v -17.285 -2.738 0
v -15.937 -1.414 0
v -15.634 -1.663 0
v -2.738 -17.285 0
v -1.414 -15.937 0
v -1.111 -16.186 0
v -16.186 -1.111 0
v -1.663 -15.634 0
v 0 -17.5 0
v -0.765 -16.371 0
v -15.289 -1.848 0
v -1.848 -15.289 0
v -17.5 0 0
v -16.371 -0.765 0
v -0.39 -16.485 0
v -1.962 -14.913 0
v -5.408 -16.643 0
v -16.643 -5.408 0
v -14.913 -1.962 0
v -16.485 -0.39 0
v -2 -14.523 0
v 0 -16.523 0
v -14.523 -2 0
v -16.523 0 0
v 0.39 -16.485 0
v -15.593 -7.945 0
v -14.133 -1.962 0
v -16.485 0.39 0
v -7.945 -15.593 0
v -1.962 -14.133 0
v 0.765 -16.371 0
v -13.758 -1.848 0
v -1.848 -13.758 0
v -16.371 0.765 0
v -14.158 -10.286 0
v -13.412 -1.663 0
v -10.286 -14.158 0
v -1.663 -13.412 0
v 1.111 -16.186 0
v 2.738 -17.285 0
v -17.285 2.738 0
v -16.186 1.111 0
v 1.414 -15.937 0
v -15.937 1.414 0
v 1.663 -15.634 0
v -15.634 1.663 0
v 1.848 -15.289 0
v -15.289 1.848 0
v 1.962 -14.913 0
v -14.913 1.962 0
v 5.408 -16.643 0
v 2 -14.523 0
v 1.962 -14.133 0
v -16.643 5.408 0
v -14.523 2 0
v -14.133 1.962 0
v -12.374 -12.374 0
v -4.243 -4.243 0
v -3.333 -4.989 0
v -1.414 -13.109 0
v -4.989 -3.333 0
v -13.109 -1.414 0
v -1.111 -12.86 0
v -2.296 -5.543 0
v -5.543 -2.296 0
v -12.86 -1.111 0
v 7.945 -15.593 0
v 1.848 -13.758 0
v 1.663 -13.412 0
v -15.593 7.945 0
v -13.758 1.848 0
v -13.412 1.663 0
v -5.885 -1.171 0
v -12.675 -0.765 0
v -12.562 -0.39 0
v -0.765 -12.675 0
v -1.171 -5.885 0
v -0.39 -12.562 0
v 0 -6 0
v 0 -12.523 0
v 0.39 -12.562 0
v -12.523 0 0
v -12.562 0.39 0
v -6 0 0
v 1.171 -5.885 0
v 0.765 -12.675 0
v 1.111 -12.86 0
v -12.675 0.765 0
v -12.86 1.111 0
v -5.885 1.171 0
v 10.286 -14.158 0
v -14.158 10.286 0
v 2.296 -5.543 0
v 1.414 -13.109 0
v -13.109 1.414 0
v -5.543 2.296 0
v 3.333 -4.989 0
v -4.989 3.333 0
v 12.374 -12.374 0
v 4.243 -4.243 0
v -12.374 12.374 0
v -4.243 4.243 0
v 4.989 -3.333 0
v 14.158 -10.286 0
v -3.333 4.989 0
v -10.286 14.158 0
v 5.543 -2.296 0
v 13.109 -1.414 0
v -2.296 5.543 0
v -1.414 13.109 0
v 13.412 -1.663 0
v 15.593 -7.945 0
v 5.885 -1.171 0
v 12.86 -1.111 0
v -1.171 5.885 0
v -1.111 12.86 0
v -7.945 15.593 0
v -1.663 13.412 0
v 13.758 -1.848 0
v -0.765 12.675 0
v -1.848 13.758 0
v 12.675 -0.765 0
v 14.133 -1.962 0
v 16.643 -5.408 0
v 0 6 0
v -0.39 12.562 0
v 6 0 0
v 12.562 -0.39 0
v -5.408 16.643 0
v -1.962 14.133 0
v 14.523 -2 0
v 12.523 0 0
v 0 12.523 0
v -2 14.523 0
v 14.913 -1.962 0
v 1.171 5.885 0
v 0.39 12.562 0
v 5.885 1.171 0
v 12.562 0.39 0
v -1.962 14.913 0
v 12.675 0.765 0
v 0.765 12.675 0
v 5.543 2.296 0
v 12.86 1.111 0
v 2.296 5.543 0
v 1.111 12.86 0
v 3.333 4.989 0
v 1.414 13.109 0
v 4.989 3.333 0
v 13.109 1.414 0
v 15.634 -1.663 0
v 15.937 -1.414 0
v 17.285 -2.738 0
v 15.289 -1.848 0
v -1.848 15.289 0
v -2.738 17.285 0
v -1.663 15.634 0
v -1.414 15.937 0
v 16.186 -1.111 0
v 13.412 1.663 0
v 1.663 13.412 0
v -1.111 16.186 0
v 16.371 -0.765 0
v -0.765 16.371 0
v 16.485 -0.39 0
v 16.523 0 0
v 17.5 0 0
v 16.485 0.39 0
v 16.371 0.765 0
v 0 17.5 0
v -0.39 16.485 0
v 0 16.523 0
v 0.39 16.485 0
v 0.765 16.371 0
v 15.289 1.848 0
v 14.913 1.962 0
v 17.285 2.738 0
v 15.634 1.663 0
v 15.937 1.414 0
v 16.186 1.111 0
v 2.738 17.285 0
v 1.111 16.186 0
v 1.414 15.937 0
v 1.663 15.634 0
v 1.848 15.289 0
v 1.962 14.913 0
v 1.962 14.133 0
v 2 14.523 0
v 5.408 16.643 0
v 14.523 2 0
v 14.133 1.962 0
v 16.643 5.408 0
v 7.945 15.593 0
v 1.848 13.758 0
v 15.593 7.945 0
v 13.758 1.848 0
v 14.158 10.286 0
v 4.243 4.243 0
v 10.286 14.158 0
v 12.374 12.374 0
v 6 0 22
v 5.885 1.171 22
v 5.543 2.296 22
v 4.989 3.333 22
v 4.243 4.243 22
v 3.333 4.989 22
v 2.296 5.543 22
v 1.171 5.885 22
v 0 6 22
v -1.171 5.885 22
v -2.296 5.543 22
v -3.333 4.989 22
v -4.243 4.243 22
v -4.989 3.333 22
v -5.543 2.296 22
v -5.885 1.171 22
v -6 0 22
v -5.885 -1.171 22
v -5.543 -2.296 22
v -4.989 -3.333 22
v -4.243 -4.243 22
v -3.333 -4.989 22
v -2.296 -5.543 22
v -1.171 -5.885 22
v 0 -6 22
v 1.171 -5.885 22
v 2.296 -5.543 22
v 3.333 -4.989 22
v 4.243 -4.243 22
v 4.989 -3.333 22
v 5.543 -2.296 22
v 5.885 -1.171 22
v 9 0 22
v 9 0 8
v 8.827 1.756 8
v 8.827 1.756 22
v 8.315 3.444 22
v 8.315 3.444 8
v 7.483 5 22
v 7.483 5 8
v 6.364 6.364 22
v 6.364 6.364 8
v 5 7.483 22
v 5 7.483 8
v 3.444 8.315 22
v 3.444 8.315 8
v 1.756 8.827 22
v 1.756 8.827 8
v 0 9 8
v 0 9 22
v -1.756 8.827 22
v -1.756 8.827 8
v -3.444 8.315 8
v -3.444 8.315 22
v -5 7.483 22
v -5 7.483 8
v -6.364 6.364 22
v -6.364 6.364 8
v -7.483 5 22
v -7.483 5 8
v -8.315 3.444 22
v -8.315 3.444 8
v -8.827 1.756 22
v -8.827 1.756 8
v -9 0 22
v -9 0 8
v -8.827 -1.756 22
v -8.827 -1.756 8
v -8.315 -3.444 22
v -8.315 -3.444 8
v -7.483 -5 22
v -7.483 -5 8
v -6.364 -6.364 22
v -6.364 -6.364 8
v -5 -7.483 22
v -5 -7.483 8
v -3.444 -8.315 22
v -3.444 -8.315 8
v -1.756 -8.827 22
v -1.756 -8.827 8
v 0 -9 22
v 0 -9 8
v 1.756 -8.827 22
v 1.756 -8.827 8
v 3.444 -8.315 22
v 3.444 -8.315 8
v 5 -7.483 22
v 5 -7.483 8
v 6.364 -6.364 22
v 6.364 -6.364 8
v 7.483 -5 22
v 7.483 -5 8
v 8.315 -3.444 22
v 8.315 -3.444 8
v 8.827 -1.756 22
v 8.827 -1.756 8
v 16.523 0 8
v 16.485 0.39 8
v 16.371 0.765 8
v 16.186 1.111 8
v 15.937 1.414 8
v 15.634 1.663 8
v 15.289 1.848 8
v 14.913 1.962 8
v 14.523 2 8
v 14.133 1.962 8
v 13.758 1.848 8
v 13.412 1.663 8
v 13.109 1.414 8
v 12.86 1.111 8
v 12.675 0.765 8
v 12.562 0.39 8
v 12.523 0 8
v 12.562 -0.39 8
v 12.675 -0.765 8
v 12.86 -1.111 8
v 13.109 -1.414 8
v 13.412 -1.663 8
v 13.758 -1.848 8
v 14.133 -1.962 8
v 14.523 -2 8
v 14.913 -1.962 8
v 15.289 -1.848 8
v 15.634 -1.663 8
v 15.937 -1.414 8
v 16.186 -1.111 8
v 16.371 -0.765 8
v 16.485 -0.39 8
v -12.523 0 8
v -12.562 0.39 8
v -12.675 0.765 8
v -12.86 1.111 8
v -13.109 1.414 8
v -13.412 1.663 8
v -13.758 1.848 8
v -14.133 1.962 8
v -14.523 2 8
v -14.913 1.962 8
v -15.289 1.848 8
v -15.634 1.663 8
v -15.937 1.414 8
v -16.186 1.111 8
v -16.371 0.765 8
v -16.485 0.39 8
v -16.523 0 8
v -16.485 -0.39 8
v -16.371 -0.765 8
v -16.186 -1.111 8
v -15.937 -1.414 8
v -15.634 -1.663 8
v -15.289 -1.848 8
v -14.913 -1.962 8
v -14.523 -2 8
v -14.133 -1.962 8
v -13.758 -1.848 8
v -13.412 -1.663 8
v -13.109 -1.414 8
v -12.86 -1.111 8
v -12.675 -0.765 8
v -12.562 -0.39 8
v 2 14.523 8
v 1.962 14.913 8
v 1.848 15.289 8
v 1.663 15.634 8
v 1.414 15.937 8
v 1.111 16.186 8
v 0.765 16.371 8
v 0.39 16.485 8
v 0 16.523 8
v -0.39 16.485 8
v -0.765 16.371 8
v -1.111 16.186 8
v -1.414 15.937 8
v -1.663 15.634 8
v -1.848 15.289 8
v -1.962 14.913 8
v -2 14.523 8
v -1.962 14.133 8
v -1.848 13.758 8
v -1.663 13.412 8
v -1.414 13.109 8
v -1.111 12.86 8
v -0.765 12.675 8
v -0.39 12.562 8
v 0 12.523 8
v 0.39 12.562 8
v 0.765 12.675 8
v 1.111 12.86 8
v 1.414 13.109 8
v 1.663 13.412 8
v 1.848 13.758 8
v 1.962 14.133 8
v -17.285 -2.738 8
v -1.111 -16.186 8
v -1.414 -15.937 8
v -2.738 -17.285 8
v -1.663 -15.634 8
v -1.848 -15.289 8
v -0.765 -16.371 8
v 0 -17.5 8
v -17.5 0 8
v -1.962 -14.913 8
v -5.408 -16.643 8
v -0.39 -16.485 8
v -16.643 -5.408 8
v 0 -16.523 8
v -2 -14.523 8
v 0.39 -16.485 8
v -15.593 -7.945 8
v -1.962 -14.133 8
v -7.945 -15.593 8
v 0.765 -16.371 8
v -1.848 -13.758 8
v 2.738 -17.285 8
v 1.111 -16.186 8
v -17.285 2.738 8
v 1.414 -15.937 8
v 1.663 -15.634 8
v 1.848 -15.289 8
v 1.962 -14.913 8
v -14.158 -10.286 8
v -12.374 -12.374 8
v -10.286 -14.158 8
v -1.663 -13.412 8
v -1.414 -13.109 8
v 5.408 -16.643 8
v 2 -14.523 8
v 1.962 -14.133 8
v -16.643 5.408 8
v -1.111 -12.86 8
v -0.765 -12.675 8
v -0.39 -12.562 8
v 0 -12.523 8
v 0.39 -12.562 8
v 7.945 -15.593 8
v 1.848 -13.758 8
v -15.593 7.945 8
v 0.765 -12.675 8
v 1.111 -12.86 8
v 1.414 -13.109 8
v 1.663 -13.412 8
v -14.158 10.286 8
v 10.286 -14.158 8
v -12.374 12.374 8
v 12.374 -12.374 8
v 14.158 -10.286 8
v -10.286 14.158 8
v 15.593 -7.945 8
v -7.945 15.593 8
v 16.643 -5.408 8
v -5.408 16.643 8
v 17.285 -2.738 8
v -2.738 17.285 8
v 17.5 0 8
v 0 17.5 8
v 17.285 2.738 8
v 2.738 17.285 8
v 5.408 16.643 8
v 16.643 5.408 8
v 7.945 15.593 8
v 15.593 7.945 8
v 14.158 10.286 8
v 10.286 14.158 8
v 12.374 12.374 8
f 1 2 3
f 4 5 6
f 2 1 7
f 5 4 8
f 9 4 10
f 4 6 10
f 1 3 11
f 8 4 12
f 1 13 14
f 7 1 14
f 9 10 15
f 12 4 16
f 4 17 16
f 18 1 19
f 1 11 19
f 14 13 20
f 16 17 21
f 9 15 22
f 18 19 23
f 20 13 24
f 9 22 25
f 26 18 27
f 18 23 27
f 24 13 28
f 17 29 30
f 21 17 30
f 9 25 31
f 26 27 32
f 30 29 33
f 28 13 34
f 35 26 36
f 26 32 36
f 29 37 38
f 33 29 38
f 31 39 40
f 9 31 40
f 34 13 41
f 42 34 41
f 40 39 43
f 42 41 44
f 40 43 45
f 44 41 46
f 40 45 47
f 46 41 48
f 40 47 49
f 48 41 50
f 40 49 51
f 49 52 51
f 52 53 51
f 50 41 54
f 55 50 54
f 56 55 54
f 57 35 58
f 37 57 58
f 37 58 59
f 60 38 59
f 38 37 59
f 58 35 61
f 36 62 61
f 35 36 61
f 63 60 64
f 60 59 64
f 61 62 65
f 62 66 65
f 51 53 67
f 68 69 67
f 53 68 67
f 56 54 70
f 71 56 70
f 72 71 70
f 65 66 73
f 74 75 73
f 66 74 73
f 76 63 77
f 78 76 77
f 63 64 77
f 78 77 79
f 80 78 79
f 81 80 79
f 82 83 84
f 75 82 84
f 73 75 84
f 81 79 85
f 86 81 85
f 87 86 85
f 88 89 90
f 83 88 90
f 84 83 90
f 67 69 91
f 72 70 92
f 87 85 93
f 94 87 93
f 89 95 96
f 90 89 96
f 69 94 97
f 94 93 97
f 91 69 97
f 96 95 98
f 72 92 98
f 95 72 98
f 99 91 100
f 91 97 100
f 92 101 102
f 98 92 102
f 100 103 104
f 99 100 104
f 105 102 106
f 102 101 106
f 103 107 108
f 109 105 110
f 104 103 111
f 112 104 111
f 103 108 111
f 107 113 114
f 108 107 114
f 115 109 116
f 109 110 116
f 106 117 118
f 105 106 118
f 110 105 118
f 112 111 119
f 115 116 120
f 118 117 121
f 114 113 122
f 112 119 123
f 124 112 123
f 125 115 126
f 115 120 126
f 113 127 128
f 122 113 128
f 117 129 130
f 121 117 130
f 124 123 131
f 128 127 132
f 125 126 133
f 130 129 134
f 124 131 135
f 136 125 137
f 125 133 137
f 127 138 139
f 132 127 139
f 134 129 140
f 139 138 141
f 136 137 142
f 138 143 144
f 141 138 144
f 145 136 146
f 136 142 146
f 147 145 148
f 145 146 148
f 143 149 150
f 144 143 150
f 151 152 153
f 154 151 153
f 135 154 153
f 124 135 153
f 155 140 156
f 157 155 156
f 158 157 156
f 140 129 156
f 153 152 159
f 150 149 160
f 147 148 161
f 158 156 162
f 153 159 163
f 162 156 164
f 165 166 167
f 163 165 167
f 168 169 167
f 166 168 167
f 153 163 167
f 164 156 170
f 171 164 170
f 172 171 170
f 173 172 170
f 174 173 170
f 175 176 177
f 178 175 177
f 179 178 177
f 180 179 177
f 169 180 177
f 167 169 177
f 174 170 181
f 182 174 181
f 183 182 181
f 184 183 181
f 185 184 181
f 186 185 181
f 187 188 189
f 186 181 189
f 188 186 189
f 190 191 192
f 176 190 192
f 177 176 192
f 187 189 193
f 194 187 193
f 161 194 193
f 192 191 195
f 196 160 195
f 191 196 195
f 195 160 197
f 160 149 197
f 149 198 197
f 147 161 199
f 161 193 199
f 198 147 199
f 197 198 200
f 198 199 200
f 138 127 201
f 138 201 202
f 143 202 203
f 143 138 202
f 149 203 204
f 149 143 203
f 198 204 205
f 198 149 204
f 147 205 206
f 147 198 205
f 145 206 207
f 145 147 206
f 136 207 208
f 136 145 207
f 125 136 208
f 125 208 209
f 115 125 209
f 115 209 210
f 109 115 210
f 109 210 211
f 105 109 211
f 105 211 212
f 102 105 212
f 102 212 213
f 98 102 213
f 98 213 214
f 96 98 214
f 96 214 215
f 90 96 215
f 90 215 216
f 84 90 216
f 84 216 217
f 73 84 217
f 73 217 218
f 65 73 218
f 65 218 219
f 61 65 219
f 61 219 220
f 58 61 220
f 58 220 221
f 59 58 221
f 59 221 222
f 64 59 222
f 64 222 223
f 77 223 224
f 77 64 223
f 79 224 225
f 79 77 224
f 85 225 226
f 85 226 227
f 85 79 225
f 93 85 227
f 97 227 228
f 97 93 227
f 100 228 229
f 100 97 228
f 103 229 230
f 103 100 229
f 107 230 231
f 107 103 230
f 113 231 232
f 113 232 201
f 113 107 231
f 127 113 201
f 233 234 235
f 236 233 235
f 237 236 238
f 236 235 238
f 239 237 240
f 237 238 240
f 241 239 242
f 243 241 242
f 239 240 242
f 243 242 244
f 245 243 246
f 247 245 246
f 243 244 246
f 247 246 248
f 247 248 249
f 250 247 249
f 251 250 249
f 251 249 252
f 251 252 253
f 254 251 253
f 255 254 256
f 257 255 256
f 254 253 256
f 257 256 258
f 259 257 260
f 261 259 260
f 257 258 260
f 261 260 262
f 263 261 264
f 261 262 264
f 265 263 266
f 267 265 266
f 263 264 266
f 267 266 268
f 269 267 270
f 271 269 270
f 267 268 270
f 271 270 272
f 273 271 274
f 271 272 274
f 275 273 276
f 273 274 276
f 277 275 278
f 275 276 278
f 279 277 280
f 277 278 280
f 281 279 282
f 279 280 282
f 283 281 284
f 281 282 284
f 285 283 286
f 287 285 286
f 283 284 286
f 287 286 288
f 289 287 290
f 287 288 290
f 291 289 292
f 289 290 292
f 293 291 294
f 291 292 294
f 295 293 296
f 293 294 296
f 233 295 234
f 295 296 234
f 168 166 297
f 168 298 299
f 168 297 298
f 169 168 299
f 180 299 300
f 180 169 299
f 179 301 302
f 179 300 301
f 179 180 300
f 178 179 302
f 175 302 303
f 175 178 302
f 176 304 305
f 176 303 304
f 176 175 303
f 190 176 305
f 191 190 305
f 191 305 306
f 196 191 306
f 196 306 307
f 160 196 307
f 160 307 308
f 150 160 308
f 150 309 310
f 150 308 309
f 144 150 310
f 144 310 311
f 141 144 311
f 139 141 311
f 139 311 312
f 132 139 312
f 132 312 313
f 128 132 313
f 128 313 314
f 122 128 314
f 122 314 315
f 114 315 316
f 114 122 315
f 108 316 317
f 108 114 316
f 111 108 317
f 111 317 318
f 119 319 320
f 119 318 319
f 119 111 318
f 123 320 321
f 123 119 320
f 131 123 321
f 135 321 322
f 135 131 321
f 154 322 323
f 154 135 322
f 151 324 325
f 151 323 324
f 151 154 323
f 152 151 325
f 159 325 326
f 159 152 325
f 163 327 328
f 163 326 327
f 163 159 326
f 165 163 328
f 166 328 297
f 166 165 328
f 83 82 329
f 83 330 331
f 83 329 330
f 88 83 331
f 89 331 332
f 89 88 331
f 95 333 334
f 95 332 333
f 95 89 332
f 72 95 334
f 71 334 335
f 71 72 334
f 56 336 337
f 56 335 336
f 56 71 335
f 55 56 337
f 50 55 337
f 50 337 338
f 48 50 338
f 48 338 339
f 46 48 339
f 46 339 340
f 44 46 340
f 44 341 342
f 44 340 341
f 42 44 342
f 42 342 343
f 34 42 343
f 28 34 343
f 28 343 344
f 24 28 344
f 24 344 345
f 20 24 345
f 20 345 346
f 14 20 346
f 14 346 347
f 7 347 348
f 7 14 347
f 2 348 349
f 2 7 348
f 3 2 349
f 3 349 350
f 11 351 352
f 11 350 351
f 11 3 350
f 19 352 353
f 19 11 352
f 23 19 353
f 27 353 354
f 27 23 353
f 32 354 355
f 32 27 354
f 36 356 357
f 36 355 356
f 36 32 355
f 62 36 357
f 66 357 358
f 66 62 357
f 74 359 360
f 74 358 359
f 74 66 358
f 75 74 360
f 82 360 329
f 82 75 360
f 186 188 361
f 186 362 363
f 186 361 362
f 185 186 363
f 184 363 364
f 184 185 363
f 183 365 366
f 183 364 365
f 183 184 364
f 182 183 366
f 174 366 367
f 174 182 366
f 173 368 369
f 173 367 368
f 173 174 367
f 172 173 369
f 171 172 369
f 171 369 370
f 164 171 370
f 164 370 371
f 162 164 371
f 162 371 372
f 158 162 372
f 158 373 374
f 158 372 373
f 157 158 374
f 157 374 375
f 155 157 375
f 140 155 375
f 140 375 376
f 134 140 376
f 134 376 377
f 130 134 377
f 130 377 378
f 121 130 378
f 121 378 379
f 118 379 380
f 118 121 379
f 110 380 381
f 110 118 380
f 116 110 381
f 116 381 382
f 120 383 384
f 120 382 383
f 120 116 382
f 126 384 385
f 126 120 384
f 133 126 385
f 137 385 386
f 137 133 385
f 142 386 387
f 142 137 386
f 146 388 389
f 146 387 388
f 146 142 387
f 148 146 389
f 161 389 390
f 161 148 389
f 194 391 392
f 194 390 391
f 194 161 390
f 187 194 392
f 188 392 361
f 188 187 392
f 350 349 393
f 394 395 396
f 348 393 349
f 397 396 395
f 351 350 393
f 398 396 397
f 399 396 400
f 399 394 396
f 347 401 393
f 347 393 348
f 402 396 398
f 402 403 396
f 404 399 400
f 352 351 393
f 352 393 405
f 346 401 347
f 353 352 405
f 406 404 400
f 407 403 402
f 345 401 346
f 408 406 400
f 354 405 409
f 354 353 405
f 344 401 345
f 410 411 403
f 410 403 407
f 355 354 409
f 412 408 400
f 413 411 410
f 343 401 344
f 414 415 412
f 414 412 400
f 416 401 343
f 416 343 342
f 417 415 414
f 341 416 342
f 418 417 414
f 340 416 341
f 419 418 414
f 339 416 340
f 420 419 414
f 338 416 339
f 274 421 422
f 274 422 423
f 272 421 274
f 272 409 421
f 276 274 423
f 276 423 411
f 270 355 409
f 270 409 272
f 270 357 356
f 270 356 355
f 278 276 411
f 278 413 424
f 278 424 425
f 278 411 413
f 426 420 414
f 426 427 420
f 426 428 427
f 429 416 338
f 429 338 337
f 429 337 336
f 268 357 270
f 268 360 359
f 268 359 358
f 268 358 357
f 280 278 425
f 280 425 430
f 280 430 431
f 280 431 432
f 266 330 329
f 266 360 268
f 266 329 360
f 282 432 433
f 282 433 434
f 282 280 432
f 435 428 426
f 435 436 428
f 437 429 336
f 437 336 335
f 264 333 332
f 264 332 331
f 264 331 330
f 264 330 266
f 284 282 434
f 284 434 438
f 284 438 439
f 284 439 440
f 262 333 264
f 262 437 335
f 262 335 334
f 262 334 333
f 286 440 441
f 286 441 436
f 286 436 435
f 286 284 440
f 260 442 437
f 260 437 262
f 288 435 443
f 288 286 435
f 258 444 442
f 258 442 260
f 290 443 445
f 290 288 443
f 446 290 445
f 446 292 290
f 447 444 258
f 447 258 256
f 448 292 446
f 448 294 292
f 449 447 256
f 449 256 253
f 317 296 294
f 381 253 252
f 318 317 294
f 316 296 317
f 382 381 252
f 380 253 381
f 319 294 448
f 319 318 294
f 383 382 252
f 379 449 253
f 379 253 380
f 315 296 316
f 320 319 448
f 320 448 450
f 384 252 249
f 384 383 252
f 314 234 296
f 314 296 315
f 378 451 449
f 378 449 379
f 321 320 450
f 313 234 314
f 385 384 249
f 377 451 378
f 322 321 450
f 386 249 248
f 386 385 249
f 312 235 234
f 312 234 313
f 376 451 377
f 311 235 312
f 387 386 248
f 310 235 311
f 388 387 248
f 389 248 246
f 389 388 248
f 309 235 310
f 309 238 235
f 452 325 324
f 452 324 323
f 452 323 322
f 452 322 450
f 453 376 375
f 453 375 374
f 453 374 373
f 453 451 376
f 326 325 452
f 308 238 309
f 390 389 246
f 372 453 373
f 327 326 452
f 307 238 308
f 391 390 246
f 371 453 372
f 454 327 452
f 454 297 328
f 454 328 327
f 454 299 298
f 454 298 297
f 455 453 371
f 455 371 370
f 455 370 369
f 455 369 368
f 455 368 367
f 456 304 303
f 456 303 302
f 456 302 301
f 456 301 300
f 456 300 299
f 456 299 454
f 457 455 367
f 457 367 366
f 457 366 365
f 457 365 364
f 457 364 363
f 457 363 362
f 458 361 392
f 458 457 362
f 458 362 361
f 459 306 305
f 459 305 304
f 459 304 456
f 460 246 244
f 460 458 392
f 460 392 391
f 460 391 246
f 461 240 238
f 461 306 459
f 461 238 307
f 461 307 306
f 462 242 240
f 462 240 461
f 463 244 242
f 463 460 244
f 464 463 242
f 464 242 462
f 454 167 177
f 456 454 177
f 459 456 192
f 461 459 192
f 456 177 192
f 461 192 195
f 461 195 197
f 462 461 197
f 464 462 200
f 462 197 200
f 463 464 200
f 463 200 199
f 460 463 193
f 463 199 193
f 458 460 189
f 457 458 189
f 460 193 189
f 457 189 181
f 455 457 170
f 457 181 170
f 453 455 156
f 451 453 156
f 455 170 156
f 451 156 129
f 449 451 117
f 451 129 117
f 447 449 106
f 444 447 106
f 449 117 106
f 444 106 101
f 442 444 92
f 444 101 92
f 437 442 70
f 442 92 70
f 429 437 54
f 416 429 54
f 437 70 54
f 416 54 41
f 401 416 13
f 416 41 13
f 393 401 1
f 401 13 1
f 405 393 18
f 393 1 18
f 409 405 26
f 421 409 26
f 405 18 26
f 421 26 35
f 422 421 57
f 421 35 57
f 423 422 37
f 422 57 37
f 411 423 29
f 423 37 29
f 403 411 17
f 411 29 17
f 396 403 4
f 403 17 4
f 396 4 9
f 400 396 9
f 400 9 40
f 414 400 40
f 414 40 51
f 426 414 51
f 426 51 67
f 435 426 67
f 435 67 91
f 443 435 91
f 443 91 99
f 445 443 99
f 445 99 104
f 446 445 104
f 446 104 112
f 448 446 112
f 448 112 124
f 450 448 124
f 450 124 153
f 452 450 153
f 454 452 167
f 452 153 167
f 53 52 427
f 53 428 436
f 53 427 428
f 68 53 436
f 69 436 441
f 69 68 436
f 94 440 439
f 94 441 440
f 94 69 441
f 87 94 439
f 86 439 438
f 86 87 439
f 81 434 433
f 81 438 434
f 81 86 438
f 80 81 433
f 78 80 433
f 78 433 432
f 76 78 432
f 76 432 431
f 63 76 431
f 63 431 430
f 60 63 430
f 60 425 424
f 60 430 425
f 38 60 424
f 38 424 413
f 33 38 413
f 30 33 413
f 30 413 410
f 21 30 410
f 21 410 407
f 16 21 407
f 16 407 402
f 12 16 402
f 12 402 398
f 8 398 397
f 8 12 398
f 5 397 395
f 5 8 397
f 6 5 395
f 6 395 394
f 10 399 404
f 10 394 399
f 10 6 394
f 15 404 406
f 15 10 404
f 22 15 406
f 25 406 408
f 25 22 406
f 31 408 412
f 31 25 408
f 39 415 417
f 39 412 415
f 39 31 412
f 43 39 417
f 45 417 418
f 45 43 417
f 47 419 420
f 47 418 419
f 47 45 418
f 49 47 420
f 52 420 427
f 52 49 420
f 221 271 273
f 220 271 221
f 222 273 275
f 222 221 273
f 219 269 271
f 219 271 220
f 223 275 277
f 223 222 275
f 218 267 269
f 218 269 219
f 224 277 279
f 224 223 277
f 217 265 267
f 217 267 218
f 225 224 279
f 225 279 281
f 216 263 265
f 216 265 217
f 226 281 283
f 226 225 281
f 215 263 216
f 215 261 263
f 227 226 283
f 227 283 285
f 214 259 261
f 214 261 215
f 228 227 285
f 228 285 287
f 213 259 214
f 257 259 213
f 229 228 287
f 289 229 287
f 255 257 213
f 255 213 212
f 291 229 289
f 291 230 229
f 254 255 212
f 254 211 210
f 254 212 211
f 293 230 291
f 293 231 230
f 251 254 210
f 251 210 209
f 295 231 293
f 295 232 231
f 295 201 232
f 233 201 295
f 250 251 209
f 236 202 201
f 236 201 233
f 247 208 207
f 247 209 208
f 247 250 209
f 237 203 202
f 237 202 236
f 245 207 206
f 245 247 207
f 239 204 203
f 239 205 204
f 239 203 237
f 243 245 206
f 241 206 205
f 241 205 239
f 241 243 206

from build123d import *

# Parameters (mm, degrees)
ESBO_O2_R                  = 17.5
RESSALTO_EXTRUS_O2_DEPTH   = 8
CORTE_EXTRUS_O2_DEPTH      = 27.009613607
CORTE_EXTRUS_O2_DEPTH_BACK = 27.009613607
ESBO_O6_R                  = 2
ESBO_O7_R                  = 9
ESBO_O7_R_2                = 6
RESSALTO_EXTRUS_O3_DEPTH   = 14
CORTE_EXTRUS_O3_DEPTH      = 29.434134416
CORTE_EXTRUS_O3_DEPTH_BACK = 29.434134416
ESBO_O8_R                  = 6


with BuildPart() as part:
    # Esboço2 → Ressalto-extrusão2 (new body)
    with BuildSketch(Plane.XY):
        Circle(ESBO_O2_R)
    extrude(amount=RESSALTO_EXTRUS_O2_DEPTH)

    # Esboço6 → Corte-extrusão2 (cut, two sides: drawn at the far end of the back side and taken through both)
    with BuildSketch(Plane.XY.offset(8).offset(-CORTE_EXTRUS_O2_DEPTH_BACK)):
        with Locations((0, 14.523179991)):
            Circle(ESBO_O6_R)
        with Locations((14.523179991, 0)):
            Circle(ESBO_O6_R)
        with Locations((0, -14.523179991)):
            Circle(ESBO_O6_R)
        with Locations((-14.523179991, 0)):
            Circle(ESBO_O6_R)
    extrude(amount=CORTE_EXTRUS_O2_DEPTH + CORTE_EXTRUS_O2_DEPTH_BACK, mode=Mode.SUBTRACT)

    # Esboço7 → Ressalto-extrusão3 (add)
    with BuildSketch(Plane.XY.offset(8)):
        Circle(ESBO_O7_R)
        Circle(ESBO_O7_R_2, mode=Mode.SUBTRACT)
    extrude(amount=RESSALTO_EXTRUS_O3_DEPTH)

    # Esboço8 → Corte-extrusão3 (cut, two sides: drawn at the far end of the back side and taken through both)
    with BuildSketch(Plane.XY.offset(8).offset(-CORTE_EXTRUS_O3_DEPTH_BACK)):
        Circle(ESBO_O8_R)
    extrude(amount=CORTE_EXTRUS_O3_DEPTH + CORTE_EXTRUS_O3_DEPTH_BACK, mode=Mode.SUBTRACT)


solid = part.part
